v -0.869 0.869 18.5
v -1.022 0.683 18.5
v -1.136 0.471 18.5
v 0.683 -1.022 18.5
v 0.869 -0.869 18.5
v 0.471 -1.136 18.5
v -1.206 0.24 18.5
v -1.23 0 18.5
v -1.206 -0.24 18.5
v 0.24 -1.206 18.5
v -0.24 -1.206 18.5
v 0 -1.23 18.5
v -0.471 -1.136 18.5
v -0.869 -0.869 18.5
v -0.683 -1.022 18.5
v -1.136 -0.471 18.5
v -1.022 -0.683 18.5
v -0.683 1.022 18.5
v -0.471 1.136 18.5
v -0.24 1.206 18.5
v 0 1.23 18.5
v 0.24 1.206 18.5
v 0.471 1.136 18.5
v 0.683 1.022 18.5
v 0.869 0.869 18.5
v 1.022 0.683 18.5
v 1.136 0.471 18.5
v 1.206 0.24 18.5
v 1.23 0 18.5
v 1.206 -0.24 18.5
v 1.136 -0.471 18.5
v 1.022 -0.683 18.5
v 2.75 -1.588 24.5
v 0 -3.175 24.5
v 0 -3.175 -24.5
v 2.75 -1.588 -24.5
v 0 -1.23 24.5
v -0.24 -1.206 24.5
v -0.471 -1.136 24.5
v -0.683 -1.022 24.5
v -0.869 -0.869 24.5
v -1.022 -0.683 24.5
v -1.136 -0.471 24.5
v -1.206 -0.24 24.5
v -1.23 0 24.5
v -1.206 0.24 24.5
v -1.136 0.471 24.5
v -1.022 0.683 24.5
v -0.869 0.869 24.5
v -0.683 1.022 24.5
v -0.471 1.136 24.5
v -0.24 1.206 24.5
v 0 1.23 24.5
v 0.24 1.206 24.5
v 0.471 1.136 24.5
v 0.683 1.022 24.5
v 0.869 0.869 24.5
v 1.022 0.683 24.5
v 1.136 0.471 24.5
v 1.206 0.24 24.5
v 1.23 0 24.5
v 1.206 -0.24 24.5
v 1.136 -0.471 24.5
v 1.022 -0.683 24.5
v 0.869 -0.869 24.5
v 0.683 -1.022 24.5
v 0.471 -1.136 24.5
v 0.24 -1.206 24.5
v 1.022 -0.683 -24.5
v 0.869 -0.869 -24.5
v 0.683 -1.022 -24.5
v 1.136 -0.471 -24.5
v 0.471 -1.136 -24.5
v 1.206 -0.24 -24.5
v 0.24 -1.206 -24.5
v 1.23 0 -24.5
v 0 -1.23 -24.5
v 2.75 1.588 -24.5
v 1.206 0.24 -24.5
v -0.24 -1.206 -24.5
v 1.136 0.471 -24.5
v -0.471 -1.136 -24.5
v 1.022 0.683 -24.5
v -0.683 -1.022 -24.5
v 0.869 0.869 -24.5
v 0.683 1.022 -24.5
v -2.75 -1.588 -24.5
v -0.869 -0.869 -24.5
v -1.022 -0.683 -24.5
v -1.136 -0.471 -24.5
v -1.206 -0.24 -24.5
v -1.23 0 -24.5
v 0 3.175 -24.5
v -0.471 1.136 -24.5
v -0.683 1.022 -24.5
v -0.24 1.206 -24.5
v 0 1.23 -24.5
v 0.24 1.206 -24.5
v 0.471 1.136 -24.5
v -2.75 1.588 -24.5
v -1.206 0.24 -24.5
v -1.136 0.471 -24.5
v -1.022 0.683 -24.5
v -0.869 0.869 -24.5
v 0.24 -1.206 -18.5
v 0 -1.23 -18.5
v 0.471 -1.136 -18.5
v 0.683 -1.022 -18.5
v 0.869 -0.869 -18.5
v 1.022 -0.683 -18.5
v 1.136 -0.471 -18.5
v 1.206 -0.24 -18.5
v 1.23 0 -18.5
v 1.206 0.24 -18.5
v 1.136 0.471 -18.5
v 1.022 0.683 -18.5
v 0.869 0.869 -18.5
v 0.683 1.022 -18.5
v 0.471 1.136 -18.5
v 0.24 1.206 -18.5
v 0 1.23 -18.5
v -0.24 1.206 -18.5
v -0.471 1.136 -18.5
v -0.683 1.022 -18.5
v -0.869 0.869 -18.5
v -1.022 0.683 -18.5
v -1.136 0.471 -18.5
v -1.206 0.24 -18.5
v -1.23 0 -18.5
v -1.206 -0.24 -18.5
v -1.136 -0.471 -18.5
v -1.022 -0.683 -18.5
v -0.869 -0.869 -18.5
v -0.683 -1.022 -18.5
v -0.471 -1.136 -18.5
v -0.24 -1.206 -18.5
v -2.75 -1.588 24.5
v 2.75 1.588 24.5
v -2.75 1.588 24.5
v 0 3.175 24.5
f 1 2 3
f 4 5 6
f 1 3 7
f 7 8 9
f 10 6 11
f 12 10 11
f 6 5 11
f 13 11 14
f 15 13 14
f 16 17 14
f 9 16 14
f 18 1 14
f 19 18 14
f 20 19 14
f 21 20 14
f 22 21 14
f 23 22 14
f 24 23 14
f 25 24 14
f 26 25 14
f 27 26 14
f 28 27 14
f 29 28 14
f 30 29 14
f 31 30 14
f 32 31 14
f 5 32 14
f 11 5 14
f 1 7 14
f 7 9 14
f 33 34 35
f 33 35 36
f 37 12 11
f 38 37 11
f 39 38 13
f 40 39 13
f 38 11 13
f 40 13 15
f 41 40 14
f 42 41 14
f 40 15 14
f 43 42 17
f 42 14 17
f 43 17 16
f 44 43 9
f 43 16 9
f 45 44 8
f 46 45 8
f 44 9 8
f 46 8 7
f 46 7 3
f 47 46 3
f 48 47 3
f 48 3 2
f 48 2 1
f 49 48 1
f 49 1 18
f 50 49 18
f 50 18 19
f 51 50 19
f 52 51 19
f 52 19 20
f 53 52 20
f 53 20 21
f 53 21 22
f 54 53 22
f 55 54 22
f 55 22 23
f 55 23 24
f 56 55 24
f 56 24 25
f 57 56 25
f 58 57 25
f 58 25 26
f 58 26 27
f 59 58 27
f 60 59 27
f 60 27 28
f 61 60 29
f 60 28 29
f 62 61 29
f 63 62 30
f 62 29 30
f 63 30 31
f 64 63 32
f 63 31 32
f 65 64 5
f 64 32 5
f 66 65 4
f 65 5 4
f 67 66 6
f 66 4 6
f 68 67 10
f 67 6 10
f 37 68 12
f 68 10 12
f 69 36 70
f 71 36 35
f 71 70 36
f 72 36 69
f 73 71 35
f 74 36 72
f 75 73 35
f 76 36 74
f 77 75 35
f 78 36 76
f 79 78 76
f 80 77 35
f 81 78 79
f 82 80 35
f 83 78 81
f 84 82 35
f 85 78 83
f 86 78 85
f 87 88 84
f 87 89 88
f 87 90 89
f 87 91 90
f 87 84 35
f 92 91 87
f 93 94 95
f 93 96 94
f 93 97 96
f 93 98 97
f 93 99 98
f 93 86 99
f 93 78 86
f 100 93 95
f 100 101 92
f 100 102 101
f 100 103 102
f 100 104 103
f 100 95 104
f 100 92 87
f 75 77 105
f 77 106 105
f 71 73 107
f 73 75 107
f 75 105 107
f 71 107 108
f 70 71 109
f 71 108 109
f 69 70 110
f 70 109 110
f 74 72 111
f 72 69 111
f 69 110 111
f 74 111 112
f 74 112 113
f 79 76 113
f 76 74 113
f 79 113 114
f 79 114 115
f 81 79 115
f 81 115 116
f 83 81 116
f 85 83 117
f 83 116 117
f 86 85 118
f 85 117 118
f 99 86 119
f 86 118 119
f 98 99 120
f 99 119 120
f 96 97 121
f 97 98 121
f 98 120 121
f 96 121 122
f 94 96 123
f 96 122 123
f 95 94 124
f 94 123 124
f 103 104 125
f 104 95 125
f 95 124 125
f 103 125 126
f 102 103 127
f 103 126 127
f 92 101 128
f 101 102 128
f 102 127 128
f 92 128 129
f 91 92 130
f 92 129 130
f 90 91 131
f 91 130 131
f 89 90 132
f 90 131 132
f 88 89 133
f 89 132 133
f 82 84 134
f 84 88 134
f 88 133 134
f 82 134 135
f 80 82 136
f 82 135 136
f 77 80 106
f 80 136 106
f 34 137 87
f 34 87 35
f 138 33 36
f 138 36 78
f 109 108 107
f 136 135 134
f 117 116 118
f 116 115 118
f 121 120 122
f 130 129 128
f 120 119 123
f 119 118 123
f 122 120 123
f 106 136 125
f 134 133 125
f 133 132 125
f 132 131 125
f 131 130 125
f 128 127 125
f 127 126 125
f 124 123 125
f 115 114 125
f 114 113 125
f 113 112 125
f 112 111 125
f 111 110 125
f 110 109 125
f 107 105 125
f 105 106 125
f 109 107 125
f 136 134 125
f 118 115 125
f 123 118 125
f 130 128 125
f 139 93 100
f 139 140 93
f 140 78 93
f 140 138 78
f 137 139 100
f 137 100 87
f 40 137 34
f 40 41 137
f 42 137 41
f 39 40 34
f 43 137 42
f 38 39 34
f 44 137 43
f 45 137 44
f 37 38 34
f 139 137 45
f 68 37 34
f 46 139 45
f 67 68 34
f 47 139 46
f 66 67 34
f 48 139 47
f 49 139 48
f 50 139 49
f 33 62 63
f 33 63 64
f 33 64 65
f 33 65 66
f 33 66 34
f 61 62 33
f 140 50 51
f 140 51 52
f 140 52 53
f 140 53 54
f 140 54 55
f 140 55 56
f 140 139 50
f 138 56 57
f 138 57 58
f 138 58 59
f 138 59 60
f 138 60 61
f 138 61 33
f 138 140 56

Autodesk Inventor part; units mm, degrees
ref_plane "YZ Plane" through (0, 0, 0) normal (1, 0, 0) x (0, 1, 0)
ref_plane "XZ Plane" through (0, 0, 0) normal (0, 1, 0) x (-1, 0, 0)
ref_plane "XY Plane" through (0, 0, 0) normal (0, 0, 1) x (1, 0, 0)
sketch "スケッチ1" plane through (0, 0, 0) normal (0, 0, 1) x (1, 0, 0)
  line L0 (2.75, 1.5877) -> (2.75, -1.5877)
  line L1 (2.75, -1.5877) -> (0, -3.1754)
  line L2 (0, -3.1754) -> (-2.75, -1.5877)
  line L3 (-2.75, -1.5877) -> (-2.75, 1.5877)
  line L4 (-2.75, 1.5877) -> (0, 3.1754)
  line L5 (0, 3.1754) -> (2.75, 1.5877)
  point P0 (0, 0)
  point P1 (0, 0)
  dimension "d0" = 5.5
extrude "押し出し1" add sketch "スケッチ1" along normal blind 24.5
sketch "スケッチ2" plane through (0, 0, 24.5) normal (0, 0, 1) x (1, 0, 0)
  point P0 (0, 0)
  point P1 (0, 0)
hole "穴1" at (0, 0, 24.5) direction (0, 0, -1) diameter 2.459 depth 6 thread size "M3x0.5" class "6H" standard "ISO Metric profile"
mirror "ミラー1" about plane through (0, 0, 0) normal (0, 0, -1) of "押し出し1", "穴1"
properties part number "ASU-340" material "ステンレス鋼 AISI 304"
